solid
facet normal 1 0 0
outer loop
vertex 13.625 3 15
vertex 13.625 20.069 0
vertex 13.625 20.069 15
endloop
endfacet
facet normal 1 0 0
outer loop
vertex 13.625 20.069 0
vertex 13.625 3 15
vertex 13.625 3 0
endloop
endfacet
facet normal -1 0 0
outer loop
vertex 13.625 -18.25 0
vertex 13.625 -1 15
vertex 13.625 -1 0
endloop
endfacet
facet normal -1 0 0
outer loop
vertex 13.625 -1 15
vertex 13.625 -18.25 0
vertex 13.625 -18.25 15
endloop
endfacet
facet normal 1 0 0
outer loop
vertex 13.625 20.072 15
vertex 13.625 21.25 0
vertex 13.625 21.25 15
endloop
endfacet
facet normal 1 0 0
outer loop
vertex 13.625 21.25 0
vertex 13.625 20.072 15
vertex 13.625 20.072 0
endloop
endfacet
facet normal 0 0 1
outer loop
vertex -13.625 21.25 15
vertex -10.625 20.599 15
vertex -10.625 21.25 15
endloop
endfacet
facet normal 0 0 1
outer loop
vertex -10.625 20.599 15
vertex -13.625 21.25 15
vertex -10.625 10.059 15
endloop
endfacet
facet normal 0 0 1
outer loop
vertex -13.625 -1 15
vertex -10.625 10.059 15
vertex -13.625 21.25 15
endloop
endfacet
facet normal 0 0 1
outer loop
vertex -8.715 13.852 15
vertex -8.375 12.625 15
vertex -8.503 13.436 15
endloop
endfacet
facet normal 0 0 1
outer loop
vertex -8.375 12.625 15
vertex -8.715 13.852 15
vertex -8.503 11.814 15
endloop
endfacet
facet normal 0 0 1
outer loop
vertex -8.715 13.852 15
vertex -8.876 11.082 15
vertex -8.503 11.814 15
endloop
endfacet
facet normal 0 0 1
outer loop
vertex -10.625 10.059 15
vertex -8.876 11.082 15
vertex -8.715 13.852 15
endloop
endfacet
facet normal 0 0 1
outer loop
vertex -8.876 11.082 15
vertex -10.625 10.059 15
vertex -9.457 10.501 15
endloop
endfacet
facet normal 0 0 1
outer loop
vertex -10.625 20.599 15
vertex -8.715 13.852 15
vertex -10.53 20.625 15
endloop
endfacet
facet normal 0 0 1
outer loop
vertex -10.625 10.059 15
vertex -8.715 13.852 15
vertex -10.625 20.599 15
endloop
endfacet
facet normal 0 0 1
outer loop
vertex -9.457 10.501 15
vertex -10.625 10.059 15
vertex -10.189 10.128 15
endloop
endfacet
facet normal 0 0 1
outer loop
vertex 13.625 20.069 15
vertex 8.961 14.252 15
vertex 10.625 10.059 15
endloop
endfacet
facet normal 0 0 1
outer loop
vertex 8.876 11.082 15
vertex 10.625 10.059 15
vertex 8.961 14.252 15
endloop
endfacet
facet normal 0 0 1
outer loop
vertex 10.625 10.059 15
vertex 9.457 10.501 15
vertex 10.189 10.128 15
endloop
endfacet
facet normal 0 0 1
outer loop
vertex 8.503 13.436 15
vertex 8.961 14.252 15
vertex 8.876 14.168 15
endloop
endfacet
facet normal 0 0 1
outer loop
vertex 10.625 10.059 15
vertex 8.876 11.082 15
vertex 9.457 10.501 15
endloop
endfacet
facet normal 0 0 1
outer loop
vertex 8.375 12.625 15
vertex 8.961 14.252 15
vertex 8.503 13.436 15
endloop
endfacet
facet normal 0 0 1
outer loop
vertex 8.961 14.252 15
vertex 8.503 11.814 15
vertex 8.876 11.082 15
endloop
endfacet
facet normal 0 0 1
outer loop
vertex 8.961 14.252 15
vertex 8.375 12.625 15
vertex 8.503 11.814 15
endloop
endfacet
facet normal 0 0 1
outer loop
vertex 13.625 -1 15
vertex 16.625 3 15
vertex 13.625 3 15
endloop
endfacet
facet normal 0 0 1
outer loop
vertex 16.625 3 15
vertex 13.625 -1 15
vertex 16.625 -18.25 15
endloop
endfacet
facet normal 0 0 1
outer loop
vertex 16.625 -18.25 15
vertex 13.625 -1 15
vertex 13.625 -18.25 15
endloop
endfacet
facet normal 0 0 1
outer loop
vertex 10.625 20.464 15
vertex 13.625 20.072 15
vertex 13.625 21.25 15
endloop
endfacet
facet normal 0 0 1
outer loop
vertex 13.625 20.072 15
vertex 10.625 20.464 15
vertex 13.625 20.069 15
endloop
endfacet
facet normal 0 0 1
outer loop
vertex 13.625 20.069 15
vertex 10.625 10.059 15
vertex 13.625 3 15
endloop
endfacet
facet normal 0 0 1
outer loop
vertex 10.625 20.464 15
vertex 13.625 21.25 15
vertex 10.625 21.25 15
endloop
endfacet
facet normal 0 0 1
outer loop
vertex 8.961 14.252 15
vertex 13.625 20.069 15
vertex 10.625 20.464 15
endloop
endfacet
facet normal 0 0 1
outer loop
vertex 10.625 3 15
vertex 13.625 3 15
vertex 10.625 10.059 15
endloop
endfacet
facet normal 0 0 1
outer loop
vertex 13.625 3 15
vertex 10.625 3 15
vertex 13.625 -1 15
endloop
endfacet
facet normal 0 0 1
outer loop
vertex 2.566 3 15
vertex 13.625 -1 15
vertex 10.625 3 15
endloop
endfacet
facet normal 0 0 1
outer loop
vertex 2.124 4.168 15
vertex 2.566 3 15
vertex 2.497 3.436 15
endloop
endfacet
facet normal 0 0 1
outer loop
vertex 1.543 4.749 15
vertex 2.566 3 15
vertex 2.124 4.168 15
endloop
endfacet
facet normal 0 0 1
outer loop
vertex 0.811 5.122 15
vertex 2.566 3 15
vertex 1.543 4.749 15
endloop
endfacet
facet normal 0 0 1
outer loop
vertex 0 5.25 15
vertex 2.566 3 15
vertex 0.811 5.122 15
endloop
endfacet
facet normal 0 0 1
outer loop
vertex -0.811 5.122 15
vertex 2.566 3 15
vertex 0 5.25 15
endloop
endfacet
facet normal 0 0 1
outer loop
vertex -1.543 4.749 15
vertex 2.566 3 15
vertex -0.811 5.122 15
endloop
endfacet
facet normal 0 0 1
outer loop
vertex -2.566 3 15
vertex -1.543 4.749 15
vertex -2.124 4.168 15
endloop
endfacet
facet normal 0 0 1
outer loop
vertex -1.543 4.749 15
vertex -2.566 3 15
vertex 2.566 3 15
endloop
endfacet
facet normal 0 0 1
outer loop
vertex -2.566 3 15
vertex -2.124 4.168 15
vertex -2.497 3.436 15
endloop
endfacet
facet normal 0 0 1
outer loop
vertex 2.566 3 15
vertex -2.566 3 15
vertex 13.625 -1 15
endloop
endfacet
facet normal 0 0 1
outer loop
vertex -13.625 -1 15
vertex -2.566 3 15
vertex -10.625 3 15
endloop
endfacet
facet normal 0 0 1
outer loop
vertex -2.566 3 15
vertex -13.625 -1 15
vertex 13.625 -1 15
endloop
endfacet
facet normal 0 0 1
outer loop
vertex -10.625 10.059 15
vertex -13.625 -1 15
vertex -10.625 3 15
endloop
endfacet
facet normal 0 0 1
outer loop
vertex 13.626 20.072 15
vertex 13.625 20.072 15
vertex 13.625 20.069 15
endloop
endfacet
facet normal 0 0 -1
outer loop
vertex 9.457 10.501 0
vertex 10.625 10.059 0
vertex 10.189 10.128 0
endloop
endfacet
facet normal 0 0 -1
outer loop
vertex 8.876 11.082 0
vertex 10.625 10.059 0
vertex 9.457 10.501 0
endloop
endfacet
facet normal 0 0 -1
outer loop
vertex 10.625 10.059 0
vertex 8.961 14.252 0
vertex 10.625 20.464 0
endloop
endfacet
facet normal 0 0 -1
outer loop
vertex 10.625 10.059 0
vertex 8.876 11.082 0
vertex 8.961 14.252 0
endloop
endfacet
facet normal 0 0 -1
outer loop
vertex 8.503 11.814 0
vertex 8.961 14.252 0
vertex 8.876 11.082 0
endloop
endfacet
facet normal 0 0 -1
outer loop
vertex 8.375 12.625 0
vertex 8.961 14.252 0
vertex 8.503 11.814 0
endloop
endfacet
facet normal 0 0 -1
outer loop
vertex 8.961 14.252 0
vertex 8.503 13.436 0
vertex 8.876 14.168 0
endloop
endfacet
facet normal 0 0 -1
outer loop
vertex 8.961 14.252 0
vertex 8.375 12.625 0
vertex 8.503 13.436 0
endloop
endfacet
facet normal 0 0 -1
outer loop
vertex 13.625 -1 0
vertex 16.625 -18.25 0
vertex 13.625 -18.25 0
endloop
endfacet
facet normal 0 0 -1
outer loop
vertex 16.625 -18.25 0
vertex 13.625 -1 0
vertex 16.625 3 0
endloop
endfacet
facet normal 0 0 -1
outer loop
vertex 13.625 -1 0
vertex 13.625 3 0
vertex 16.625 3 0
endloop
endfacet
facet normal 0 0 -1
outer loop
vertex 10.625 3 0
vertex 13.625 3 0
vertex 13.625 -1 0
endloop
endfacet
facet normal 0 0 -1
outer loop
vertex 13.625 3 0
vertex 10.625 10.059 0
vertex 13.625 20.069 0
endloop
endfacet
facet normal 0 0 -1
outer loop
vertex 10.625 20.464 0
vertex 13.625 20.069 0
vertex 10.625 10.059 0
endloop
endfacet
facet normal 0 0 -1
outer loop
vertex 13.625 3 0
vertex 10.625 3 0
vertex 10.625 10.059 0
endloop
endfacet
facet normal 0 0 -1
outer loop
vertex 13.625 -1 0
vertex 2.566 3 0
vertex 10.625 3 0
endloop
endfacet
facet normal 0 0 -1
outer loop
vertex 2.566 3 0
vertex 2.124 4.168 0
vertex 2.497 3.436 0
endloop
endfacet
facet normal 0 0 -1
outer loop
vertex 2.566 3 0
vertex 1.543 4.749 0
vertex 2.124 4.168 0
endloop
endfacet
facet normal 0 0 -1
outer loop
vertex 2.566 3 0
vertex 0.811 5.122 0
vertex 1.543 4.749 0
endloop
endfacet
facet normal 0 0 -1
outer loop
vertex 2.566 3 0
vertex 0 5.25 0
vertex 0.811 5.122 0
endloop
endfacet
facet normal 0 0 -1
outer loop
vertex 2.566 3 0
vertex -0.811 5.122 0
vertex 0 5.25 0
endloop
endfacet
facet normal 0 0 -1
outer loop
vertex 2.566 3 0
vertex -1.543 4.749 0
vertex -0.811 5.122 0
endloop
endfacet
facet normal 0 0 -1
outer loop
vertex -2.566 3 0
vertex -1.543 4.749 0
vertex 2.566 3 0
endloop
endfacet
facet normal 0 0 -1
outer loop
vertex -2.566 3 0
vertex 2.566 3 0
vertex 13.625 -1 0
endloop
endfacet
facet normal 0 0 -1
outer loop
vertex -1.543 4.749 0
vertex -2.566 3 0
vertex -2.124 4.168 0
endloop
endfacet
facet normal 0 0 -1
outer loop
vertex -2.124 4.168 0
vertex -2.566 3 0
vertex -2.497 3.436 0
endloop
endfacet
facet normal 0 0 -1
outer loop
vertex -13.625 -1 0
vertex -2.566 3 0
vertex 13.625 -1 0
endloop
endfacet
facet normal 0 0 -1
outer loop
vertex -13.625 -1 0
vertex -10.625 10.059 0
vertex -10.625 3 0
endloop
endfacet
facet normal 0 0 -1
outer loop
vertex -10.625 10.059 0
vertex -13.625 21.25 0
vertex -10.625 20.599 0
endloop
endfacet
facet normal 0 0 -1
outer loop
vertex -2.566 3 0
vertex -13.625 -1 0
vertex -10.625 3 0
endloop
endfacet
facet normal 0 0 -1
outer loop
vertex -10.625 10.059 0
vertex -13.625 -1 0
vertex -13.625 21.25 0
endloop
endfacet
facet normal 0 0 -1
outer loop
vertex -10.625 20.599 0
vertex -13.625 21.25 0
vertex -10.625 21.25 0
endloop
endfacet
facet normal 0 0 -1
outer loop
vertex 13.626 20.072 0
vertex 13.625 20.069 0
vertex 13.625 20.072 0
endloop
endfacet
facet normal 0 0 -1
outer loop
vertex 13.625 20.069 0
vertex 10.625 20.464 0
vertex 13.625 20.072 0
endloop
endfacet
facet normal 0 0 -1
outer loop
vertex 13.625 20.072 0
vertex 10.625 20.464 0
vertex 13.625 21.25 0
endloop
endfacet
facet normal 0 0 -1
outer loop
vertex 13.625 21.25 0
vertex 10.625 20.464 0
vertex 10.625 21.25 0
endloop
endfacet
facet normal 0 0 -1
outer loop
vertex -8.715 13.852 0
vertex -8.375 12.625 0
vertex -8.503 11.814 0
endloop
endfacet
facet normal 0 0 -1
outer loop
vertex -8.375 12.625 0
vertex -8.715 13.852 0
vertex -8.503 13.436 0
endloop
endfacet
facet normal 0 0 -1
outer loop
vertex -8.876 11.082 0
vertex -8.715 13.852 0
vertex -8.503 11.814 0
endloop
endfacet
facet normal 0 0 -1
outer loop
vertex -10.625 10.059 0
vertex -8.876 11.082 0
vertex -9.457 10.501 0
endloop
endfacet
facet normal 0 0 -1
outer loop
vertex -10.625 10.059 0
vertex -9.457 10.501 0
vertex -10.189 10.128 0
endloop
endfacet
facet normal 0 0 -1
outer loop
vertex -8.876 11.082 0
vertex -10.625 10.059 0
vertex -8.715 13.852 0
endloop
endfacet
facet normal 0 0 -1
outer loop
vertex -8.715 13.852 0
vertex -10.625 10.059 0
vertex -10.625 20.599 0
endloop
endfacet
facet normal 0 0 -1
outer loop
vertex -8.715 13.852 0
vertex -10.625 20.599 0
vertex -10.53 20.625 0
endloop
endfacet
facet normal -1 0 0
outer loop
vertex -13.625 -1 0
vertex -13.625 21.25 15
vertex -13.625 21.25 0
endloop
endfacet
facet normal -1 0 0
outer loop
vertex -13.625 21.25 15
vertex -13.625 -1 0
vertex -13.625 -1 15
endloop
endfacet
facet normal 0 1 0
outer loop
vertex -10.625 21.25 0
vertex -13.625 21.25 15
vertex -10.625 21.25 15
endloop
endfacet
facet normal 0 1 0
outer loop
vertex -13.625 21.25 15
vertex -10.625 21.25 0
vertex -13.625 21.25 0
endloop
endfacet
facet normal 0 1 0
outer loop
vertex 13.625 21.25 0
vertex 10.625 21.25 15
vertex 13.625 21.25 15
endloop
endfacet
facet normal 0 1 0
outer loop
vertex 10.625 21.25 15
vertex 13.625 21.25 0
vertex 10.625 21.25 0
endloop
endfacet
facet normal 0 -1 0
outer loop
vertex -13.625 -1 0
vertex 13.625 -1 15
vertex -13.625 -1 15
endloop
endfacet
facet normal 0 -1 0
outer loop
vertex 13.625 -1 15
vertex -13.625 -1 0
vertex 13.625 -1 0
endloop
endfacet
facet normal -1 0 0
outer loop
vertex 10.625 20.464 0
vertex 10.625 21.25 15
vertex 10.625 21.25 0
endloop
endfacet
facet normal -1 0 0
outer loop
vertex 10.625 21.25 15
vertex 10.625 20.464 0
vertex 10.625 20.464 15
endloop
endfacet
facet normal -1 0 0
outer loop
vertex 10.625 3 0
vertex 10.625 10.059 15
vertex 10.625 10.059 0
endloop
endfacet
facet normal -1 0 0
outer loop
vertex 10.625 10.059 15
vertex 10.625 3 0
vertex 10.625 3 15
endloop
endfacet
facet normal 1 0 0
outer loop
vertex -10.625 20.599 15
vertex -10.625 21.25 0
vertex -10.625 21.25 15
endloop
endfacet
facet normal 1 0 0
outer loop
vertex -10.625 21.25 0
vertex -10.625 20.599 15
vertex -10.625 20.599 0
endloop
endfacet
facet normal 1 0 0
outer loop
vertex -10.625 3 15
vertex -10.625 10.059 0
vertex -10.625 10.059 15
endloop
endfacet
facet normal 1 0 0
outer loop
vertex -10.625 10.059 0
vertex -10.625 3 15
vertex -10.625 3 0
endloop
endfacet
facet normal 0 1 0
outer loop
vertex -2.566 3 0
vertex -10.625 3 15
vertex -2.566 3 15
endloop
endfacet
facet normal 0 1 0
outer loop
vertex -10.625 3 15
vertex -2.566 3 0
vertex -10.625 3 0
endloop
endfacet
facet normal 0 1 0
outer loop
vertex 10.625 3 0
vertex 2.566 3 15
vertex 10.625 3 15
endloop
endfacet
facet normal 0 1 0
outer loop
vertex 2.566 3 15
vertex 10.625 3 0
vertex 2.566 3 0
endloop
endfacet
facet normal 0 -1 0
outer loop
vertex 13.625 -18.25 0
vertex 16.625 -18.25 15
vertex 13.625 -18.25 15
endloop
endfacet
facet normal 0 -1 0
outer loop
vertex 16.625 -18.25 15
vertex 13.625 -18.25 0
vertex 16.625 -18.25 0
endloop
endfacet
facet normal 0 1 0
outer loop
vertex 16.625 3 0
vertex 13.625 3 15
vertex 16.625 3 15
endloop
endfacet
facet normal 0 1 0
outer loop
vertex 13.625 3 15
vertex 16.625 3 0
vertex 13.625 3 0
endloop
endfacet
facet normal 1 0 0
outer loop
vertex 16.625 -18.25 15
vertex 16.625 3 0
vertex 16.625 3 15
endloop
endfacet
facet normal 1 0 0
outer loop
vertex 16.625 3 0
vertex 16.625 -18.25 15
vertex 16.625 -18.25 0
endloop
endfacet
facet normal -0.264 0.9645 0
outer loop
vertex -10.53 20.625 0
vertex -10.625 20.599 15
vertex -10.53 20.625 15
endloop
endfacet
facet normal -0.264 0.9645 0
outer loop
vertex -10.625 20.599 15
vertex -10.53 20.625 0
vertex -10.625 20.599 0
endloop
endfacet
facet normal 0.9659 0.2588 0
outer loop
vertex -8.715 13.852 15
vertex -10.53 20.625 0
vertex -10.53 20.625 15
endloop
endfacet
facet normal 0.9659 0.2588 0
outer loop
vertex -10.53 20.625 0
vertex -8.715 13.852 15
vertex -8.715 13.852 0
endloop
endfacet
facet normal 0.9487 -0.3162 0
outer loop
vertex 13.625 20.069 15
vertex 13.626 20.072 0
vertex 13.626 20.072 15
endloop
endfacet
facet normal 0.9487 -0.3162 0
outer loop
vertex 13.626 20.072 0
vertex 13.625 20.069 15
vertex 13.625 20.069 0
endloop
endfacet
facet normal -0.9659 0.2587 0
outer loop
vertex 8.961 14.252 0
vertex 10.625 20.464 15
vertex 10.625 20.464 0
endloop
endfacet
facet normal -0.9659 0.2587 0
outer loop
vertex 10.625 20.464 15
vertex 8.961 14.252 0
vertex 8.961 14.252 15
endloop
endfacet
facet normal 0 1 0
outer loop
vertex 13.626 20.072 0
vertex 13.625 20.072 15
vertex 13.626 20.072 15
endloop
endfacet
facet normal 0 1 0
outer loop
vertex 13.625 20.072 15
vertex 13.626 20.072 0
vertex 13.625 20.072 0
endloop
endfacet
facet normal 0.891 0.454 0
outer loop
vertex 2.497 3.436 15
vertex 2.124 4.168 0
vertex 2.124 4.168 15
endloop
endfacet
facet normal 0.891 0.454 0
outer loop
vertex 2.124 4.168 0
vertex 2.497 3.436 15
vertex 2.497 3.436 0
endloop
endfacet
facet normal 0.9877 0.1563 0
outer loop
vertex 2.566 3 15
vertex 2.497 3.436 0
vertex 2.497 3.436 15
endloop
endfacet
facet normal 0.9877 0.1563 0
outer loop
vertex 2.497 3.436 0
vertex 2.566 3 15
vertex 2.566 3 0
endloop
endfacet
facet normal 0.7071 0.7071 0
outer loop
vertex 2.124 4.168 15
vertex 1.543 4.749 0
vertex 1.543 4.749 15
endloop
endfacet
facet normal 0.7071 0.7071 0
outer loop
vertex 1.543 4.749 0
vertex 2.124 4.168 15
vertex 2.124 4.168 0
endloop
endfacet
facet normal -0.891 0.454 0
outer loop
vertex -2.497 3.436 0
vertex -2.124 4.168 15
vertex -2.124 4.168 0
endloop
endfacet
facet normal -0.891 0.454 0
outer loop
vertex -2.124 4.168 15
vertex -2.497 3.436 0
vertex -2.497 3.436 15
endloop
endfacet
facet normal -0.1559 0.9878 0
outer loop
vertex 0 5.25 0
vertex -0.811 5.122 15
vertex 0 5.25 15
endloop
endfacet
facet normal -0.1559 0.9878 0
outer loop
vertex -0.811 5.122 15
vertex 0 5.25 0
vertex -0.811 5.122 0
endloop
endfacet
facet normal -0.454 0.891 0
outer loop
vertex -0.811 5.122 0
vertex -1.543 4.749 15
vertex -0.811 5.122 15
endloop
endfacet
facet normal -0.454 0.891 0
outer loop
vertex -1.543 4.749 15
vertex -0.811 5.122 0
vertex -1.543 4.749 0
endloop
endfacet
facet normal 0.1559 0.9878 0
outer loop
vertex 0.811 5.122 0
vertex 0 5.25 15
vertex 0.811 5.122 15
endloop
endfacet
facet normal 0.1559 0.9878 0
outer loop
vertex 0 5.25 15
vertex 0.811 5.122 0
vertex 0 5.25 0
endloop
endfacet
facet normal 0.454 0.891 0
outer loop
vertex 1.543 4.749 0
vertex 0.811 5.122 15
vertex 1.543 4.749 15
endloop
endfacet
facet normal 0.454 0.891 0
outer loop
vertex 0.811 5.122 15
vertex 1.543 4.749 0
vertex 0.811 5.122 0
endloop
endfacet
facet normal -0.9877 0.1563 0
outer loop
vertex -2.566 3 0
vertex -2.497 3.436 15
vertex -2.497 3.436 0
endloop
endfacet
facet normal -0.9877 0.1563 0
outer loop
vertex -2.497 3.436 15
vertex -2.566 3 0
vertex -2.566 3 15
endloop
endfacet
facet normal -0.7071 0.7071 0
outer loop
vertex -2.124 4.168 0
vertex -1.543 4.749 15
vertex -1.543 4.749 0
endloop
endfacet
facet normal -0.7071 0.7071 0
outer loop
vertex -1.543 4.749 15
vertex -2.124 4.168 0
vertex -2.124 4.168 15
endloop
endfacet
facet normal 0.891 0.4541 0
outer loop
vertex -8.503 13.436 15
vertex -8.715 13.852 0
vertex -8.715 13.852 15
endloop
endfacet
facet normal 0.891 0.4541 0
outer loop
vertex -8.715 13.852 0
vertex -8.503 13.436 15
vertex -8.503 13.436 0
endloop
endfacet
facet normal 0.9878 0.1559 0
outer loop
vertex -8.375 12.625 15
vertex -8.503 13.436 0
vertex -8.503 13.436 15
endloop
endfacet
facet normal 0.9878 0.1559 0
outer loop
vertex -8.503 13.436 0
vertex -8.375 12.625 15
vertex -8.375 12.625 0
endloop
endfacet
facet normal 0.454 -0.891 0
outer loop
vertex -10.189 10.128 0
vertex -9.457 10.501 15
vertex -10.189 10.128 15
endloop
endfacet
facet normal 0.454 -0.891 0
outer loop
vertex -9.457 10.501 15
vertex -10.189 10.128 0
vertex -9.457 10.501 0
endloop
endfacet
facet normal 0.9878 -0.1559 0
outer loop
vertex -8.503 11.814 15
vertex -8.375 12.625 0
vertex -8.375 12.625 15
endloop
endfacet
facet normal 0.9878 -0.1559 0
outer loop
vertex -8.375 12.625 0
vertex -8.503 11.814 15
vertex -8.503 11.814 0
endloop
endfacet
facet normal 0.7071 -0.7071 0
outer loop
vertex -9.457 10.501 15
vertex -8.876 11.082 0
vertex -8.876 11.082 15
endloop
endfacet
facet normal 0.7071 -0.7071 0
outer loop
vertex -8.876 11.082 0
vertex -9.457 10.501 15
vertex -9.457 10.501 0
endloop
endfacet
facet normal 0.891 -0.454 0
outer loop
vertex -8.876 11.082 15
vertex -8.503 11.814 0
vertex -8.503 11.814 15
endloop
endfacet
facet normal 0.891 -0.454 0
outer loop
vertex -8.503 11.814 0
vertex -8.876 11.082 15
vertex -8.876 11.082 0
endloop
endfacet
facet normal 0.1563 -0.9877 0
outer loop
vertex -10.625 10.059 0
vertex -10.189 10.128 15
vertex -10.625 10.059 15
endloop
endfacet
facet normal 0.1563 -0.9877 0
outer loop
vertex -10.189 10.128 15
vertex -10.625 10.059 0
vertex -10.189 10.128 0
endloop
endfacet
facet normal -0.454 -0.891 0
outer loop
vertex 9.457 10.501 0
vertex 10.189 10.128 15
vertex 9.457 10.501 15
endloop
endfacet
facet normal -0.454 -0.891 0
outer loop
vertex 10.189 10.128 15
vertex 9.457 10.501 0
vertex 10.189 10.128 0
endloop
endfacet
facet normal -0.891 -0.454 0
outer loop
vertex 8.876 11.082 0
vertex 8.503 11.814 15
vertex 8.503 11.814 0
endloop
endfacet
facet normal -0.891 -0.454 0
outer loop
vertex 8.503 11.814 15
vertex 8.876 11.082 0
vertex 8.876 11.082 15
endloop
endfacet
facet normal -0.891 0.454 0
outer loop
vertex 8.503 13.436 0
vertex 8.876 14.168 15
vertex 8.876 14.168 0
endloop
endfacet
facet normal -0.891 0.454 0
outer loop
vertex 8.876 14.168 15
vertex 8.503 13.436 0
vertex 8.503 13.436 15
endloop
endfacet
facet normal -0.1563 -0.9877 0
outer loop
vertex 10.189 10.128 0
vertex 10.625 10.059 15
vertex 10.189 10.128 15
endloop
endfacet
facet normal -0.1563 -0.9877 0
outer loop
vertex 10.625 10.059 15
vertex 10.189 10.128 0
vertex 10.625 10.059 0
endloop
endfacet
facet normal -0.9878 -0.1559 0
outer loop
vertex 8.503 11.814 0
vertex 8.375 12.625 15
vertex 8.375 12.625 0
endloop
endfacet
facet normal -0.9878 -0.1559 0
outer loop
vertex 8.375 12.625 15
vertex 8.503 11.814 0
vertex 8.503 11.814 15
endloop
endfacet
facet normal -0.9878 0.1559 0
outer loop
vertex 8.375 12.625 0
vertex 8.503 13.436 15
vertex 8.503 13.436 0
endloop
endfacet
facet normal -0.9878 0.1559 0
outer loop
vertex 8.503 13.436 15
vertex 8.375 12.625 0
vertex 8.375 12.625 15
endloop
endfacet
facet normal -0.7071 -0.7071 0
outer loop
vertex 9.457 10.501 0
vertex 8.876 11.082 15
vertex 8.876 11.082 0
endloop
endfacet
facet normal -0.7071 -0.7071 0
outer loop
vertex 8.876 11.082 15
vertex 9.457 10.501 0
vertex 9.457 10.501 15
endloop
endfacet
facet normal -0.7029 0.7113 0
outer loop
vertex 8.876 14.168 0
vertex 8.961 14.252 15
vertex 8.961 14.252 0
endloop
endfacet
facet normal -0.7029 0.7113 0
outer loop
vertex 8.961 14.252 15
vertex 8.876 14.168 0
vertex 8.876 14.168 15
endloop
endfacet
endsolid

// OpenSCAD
// nischi 
// mendel max clip

breite = 27.25;
tiefe  = 22.25;
hoehe  = 15.00;

dicke1 = 3.0;
dicke2 = 3.6;

misumi = 20.00;    
misumi_hole = 5.25;

// lochtiefe  7.00
// lochbreite 5.25

translate([0,0,0]) rotate([0,0,0]) tool_clip();

module tool_clip()
{
  difference()
  {
    union()
    {
        color("blue") translate([-breite/2,-1,0]) cube([breite,tiefe,hoehe]);  
    }

    union()
    {
       color("blue") translate([-breite/2+dicke1,dicke1,-1]) 
       cube([breite-2*dicke1,tiefe,hoehe*2]);
           // cylinder(20, r=5/2,$fn=20);
    }
  }
  translate([breite/2,3,0])
  rotate([0,0,-90])
  cube([breite-2*dicke1, 3,hoehe]);

  color("lightblue") translate([-breite/2+2.3,misumi/2+2,0]) 
  rotate([0,0,15]) cube([3,tiefe/2-3,hoehe]);  

  color("lightblue") translate([+breite/2-5,misumi/2+3,0]) 
  rotate([0,0,-15]) cube([3,tiefe/2-3,hoehe]);

  color("red")  translate([0,misumi_hole/2,0]) cylinder(hoehe, r=misumi_hole/2,$fn=20);

  color("orange")  translate([-breite/2+misumi_hole/2,misumi_hole/2+misumi/2,0]) 
  cylinder(hoehe, r=misumi_hole/2,$fn=20);
  color("orange")  translate([ breite/2-misumi_hole/2,misumi_hole/2+misumi/2,0]) 
  cylinder(hoehe, r=misumi_hole/2,$fn=20);
}
